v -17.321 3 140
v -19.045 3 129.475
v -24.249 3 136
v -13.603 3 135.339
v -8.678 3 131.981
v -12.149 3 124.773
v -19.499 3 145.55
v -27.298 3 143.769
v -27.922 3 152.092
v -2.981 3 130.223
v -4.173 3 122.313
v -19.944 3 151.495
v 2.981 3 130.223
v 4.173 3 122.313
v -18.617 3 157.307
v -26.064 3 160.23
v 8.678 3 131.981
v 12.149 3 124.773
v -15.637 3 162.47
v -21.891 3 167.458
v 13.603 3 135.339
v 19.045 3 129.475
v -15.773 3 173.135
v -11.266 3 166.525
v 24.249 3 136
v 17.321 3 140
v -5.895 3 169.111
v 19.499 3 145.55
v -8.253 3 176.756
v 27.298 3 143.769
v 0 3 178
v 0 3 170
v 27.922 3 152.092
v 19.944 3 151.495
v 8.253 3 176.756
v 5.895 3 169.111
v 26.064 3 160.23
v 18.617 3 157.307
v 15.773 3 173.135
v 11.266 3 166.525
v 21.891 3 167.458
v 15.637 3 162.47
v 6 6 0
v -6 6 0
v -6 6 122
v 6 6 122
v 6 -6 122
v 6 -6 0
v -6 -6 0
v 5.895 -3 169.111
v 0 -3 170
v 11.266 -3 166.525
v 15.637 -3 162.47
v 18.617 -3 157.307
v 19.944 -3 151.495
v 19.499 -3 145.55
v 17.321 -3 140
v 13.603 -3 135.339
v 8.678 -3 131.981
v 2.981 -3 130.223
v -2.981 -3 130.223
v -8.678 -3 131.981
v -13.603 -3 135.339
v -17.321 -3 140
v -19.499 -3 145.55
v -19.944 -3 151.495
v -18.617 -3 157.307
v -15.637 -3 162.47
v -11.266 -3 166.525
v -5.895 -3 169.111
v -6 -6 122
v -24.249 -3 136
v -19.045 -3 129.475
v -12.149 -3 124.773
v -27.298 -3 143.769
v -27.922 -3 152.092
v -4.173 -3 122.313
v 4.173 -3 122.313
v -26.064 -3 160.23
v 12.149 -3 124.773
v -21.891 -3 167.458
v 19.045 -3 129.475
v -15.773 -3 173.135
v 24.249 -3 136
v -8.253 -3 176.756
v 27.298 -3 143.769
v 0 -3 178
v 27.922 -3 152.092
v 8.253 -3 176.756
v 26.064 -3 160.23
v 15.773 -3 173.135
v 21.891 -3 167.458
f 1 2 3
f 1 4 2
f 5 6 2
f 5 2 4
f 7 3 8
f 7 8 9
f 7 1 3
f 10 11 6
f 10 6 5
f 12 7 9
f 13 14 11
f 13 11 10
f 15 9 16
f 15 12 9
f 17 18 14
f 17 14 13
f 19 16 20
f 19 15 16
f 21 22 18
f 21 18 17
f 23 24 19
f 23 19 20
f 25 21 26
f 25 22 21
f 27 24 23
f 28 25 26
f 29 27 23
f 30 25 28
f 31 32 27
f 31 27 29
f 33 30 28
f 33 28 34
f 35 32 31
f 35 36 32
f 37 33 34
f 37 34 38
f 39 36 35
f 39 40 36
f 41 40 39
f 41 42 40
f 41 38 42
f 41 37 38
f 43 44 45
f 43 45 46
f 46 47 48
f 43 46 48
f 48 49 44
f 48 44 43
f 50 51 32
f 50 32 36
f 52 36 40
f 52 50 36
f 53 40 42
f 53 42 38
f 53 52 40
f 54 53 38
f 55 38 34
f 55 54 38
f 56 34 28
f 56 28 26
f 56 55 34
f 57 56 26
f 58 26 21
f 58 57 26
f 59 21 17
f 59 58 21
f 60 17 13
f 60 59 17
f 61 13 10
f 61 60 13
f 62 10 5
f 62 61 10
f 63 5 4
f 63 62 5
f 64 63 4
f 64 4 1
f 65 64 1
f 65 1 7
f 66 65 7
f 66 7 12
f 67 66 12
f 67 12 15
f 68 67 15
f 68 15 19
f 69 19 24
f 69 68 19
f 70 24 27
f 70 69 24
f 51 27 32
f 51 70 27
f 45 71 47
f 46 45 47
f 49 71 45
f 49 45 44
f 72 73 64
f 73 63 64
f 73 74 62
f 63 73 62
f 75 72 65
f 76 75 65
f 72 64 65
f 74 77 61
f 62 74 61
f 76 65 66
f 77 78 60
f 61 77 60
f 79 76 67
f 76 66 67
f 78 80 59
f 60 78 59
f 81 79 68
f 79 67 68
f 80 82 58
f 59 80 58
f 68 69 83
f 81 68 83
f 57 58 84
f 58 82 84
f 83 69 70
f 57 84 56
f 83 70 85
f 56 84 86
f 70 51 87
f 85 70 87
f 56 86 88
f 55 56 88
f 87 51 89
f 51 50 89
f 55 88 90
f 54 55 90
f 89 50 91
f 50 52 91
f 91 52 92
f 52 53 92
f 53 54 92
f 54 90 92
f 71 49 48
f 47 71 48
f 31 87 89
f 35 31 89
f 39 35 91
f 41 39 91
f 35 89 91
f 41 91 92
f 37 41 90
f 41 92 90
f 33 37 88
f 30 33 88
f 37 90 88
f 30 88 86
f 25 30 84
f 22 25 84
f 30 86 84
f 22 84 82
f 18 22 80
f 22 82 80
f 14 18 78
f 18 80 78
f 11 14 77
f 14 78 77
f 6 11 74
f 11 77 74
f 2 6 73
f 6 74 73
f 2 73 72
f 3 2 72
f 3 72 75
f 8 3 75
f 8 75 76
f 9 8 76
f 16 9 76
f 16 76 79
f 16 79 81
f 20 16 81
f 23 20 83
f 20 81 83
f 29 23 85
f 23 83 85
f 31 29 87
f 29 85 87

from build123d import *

# Parameters (mm, degrees)
SKETCH1_R    = 28
SKETCH1_R_2  = 20
RING_DEPTH   = 6
SKETCH2_W    = 12
SKETCH2_H    = 122
HANDLE_DEPTH = 12


with BuildPart() as part:
    # Sketch1 → Ring (new body)
    with BuildSketch(Plane(origin=(0, -3, 0), x_dir=(1, 0, 0), z_dir=(0, 1, 0))):
        with Locations(Location((0, -150, 0), (0, 0, 270))):
            Circle(SKETCH1_R)
        with Locations(Location((0, -150, 0), (0, 0, 270))):
            Circle(SKETCH1_R_2, mode=Mode.SUBTRACT)
    extrude(amount=RING_DEPTH)


with BuildPart() as body_2:
    # Sketch2 → Handle (new body)
    with BuildSketch(Plane(origin=(0, -6, 0), x_dir=(1, 0, 0), z_dir=(0, 1, 0))):
        with Locations((0, -61)):
            Rectangle(SKETCH2_W, SKETCH2_H)
    extrude(amount=HANDLE_DEPTH)


solid = Compound([part.part, body_2.part])
